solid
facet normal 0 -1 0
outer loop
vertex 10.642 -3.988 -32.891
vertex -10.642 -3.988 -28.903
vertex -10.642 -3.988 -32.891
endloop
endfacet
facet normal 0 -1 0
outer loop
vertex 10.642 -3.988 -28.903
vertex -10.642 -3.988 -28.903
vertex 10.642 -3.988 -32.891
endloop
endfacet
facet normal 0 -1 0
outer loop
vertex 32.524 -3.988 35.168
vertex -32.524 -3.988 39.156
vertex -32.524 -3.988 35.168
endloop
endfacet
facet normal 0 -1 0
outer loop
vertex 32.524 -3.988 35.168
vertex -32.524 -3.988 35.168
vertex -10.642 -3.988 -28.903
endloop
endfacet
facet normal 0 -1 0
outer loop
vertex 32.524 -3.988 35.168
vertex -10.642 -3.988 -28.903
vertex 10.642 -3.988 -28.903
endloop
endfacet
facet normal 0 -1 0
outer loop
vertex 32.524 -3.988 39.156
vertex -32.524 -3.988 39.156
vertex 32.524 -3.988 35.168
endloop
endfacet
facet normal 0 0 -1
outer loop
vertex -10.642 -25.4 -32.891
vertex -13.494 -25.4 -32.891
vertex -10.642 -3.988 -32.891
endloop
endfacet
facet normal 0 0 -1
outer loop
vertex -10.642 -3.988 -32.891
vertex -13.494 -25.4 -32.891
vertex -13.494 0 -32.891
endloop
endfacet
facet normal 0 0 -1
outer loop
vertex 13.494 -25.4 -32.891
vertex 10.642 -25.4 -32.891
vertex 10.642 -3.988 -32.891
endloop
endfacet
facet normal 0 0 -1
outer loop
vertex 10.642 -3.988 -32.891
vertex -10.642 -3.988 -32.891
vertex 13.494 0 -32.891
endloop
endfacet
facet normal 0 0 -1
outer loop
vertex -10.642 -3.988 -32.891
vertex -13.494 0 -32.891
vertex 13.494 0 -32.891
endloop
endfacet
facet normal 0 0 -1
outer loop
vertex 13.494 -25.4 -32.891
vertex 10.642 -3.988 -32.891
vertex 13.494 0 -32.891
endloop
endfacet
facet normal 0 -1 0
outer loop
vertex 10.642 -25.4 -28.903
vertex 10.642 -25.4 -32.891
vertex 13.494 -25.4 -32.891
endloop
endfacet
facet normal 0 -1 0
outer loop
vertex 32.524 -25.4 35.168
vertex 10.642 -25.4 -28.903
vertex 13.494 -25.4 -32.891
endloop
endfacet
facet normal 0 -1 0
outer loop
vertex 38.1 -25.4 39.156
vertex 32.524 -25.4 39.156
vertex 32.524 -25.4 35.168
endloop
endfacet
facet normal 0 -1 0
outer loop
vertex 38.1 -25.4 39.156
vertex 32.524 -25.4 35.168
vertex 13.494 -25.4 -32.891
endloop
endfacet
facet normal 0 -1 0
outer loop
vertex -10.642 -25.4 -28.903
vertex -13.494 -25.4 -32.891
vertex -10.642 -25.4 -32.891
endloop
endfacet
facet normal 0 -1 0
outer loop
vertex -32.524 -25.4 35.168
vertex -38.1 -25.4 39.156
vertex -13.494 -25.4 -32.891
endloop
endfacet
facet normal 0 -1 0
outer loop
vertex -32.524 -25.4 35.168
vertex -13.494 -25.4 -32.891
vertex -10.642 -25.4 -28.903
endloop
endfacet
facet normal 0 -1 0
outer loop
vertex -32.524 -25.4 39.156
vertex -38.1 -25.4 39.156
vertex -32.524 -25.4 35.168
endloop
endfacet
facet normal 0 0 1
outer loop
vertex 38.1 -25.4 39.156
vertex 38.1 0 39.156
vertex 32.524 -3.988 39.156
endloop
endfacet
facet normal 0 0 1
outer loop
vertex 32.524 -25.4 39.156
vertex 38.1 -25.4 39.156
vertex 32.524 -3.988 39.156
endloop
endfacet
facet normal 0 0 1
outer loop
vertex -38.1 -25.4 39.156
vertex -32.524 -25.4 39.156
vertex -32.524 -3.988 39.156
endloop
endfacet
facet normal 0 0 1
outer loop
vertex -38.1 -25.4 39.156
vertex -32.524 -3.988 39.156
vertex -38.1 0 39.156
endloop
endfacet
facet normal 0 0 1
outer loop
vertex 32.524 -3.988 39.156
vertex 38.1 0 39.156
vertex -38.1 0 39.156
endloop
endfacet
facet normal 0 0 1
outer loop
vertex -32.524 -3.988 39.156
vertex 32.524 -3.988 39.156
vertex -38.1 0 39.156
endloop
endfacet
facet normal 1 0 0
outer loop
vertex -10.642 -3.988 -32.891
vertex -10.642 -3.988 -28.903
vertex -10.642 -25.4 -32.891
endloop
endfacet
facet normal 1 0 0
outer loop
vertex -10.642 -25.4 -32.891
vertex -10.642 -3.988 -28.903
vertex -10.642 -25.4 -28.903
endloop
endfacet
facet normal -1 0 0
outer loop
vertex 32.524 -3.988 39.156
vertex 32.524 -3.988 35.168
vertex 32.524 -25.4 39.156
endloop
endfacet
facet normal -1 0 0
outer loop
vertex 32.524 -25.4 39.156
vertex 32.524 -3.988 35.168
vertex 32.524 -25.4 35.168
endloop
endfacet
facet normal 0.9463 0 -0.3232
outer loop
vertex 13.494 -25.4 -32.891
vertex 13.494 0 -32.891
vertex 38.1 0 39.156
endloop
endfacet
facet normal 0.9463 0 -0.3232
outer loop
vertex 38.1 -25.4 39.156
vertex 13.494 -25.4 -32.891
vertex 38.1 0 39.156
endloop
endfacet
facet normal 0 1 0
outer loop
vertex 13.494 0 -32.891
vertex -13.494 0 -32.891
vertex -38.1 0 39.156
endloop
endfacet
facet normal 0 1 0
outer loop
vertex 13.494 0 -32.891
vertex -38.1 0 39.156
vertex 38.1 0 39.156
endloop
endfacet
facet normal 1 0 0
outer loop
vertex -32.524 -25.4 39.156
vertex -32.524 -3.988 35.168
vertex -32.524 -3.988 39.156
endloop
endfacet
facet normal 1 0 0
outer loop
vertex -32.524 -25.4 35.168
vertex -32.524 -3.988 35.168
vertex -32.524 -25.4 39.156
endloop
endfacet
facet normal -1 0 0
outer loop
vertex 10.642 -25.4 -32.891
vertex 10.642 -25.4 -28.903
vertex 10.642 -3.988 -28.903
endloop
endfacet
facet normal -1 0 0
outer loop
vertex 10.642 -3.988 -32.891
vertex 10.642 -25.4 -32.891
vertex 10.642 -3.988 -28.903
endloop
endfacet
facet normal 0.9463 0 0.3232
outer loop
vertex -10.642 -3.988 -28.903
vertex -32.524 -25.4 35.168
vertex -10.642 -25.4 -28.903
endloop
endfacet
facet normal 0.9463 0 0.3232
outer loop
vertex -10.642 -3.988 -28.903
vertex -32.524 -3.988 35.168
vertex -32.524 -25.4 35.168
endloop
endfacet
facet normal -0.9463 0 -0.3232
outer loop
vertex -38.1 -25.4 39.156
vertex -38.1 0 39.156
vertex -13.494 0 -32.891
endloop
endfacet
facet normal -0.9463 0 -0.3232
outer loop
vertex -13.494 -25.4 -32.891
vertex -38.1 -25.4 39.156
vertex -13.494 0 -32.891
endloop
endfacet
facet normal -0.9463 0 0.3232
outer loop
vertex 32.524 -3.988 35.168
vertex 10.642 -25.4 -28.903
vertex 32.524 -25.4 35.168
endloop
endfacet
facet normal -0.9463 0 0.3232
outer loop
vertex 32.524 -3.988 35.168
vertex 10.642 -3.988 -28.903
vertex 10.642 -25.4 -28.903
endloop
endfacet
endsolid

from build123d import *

# Parameters (mm, degrees)
F1_DEPTH = 25.4
F2_T     = -3.9878
F3_DEPTH = 3.9878
F4_DEPTH = 3.9878


with BuildPart() as f1:
    # F0 (on Front) → F1 (new body)
    with BuildSketch(Plane.XZ):
        Polygon((0, -32.8910034207), (13.49375, -32.8910034207), (38.1, 39.1559594118), (0, 39.1559594118), (-38.1, 39.1559594118), (-13.49375, -32.8910034207), align=None)
    extrude(amount=F1_DEPTH)

    # F2
    f2_openings = [f1.faces().sort_by_distance(p)[0] for p in [
        (0, -25.4, 8.859288),
    ]]
    offset(amount=F2_T, openings=f2_openings)

    # F3 (cut, through all): a face of the model
    f3_faces = [f1.faces().sort_by_distance(p)[0] for p in [
        (0, -14.6939, -28.9032034207),
    ]]
    extrude(f3_faces, amount=-F3_DEPTH, mode=Mode.SUBTRACT)

    # F4 (cut, through all): a face of the model
    f4_faces = [f1.faces().sort_by_distance(p)[0] for p in [
        (0, -14.6939, 35.1681594118),
    ]]
    extrude(f4_faces, amount=-F4_DEPTH, mode=Mode.SUBTRACT)


solid = f1.part
